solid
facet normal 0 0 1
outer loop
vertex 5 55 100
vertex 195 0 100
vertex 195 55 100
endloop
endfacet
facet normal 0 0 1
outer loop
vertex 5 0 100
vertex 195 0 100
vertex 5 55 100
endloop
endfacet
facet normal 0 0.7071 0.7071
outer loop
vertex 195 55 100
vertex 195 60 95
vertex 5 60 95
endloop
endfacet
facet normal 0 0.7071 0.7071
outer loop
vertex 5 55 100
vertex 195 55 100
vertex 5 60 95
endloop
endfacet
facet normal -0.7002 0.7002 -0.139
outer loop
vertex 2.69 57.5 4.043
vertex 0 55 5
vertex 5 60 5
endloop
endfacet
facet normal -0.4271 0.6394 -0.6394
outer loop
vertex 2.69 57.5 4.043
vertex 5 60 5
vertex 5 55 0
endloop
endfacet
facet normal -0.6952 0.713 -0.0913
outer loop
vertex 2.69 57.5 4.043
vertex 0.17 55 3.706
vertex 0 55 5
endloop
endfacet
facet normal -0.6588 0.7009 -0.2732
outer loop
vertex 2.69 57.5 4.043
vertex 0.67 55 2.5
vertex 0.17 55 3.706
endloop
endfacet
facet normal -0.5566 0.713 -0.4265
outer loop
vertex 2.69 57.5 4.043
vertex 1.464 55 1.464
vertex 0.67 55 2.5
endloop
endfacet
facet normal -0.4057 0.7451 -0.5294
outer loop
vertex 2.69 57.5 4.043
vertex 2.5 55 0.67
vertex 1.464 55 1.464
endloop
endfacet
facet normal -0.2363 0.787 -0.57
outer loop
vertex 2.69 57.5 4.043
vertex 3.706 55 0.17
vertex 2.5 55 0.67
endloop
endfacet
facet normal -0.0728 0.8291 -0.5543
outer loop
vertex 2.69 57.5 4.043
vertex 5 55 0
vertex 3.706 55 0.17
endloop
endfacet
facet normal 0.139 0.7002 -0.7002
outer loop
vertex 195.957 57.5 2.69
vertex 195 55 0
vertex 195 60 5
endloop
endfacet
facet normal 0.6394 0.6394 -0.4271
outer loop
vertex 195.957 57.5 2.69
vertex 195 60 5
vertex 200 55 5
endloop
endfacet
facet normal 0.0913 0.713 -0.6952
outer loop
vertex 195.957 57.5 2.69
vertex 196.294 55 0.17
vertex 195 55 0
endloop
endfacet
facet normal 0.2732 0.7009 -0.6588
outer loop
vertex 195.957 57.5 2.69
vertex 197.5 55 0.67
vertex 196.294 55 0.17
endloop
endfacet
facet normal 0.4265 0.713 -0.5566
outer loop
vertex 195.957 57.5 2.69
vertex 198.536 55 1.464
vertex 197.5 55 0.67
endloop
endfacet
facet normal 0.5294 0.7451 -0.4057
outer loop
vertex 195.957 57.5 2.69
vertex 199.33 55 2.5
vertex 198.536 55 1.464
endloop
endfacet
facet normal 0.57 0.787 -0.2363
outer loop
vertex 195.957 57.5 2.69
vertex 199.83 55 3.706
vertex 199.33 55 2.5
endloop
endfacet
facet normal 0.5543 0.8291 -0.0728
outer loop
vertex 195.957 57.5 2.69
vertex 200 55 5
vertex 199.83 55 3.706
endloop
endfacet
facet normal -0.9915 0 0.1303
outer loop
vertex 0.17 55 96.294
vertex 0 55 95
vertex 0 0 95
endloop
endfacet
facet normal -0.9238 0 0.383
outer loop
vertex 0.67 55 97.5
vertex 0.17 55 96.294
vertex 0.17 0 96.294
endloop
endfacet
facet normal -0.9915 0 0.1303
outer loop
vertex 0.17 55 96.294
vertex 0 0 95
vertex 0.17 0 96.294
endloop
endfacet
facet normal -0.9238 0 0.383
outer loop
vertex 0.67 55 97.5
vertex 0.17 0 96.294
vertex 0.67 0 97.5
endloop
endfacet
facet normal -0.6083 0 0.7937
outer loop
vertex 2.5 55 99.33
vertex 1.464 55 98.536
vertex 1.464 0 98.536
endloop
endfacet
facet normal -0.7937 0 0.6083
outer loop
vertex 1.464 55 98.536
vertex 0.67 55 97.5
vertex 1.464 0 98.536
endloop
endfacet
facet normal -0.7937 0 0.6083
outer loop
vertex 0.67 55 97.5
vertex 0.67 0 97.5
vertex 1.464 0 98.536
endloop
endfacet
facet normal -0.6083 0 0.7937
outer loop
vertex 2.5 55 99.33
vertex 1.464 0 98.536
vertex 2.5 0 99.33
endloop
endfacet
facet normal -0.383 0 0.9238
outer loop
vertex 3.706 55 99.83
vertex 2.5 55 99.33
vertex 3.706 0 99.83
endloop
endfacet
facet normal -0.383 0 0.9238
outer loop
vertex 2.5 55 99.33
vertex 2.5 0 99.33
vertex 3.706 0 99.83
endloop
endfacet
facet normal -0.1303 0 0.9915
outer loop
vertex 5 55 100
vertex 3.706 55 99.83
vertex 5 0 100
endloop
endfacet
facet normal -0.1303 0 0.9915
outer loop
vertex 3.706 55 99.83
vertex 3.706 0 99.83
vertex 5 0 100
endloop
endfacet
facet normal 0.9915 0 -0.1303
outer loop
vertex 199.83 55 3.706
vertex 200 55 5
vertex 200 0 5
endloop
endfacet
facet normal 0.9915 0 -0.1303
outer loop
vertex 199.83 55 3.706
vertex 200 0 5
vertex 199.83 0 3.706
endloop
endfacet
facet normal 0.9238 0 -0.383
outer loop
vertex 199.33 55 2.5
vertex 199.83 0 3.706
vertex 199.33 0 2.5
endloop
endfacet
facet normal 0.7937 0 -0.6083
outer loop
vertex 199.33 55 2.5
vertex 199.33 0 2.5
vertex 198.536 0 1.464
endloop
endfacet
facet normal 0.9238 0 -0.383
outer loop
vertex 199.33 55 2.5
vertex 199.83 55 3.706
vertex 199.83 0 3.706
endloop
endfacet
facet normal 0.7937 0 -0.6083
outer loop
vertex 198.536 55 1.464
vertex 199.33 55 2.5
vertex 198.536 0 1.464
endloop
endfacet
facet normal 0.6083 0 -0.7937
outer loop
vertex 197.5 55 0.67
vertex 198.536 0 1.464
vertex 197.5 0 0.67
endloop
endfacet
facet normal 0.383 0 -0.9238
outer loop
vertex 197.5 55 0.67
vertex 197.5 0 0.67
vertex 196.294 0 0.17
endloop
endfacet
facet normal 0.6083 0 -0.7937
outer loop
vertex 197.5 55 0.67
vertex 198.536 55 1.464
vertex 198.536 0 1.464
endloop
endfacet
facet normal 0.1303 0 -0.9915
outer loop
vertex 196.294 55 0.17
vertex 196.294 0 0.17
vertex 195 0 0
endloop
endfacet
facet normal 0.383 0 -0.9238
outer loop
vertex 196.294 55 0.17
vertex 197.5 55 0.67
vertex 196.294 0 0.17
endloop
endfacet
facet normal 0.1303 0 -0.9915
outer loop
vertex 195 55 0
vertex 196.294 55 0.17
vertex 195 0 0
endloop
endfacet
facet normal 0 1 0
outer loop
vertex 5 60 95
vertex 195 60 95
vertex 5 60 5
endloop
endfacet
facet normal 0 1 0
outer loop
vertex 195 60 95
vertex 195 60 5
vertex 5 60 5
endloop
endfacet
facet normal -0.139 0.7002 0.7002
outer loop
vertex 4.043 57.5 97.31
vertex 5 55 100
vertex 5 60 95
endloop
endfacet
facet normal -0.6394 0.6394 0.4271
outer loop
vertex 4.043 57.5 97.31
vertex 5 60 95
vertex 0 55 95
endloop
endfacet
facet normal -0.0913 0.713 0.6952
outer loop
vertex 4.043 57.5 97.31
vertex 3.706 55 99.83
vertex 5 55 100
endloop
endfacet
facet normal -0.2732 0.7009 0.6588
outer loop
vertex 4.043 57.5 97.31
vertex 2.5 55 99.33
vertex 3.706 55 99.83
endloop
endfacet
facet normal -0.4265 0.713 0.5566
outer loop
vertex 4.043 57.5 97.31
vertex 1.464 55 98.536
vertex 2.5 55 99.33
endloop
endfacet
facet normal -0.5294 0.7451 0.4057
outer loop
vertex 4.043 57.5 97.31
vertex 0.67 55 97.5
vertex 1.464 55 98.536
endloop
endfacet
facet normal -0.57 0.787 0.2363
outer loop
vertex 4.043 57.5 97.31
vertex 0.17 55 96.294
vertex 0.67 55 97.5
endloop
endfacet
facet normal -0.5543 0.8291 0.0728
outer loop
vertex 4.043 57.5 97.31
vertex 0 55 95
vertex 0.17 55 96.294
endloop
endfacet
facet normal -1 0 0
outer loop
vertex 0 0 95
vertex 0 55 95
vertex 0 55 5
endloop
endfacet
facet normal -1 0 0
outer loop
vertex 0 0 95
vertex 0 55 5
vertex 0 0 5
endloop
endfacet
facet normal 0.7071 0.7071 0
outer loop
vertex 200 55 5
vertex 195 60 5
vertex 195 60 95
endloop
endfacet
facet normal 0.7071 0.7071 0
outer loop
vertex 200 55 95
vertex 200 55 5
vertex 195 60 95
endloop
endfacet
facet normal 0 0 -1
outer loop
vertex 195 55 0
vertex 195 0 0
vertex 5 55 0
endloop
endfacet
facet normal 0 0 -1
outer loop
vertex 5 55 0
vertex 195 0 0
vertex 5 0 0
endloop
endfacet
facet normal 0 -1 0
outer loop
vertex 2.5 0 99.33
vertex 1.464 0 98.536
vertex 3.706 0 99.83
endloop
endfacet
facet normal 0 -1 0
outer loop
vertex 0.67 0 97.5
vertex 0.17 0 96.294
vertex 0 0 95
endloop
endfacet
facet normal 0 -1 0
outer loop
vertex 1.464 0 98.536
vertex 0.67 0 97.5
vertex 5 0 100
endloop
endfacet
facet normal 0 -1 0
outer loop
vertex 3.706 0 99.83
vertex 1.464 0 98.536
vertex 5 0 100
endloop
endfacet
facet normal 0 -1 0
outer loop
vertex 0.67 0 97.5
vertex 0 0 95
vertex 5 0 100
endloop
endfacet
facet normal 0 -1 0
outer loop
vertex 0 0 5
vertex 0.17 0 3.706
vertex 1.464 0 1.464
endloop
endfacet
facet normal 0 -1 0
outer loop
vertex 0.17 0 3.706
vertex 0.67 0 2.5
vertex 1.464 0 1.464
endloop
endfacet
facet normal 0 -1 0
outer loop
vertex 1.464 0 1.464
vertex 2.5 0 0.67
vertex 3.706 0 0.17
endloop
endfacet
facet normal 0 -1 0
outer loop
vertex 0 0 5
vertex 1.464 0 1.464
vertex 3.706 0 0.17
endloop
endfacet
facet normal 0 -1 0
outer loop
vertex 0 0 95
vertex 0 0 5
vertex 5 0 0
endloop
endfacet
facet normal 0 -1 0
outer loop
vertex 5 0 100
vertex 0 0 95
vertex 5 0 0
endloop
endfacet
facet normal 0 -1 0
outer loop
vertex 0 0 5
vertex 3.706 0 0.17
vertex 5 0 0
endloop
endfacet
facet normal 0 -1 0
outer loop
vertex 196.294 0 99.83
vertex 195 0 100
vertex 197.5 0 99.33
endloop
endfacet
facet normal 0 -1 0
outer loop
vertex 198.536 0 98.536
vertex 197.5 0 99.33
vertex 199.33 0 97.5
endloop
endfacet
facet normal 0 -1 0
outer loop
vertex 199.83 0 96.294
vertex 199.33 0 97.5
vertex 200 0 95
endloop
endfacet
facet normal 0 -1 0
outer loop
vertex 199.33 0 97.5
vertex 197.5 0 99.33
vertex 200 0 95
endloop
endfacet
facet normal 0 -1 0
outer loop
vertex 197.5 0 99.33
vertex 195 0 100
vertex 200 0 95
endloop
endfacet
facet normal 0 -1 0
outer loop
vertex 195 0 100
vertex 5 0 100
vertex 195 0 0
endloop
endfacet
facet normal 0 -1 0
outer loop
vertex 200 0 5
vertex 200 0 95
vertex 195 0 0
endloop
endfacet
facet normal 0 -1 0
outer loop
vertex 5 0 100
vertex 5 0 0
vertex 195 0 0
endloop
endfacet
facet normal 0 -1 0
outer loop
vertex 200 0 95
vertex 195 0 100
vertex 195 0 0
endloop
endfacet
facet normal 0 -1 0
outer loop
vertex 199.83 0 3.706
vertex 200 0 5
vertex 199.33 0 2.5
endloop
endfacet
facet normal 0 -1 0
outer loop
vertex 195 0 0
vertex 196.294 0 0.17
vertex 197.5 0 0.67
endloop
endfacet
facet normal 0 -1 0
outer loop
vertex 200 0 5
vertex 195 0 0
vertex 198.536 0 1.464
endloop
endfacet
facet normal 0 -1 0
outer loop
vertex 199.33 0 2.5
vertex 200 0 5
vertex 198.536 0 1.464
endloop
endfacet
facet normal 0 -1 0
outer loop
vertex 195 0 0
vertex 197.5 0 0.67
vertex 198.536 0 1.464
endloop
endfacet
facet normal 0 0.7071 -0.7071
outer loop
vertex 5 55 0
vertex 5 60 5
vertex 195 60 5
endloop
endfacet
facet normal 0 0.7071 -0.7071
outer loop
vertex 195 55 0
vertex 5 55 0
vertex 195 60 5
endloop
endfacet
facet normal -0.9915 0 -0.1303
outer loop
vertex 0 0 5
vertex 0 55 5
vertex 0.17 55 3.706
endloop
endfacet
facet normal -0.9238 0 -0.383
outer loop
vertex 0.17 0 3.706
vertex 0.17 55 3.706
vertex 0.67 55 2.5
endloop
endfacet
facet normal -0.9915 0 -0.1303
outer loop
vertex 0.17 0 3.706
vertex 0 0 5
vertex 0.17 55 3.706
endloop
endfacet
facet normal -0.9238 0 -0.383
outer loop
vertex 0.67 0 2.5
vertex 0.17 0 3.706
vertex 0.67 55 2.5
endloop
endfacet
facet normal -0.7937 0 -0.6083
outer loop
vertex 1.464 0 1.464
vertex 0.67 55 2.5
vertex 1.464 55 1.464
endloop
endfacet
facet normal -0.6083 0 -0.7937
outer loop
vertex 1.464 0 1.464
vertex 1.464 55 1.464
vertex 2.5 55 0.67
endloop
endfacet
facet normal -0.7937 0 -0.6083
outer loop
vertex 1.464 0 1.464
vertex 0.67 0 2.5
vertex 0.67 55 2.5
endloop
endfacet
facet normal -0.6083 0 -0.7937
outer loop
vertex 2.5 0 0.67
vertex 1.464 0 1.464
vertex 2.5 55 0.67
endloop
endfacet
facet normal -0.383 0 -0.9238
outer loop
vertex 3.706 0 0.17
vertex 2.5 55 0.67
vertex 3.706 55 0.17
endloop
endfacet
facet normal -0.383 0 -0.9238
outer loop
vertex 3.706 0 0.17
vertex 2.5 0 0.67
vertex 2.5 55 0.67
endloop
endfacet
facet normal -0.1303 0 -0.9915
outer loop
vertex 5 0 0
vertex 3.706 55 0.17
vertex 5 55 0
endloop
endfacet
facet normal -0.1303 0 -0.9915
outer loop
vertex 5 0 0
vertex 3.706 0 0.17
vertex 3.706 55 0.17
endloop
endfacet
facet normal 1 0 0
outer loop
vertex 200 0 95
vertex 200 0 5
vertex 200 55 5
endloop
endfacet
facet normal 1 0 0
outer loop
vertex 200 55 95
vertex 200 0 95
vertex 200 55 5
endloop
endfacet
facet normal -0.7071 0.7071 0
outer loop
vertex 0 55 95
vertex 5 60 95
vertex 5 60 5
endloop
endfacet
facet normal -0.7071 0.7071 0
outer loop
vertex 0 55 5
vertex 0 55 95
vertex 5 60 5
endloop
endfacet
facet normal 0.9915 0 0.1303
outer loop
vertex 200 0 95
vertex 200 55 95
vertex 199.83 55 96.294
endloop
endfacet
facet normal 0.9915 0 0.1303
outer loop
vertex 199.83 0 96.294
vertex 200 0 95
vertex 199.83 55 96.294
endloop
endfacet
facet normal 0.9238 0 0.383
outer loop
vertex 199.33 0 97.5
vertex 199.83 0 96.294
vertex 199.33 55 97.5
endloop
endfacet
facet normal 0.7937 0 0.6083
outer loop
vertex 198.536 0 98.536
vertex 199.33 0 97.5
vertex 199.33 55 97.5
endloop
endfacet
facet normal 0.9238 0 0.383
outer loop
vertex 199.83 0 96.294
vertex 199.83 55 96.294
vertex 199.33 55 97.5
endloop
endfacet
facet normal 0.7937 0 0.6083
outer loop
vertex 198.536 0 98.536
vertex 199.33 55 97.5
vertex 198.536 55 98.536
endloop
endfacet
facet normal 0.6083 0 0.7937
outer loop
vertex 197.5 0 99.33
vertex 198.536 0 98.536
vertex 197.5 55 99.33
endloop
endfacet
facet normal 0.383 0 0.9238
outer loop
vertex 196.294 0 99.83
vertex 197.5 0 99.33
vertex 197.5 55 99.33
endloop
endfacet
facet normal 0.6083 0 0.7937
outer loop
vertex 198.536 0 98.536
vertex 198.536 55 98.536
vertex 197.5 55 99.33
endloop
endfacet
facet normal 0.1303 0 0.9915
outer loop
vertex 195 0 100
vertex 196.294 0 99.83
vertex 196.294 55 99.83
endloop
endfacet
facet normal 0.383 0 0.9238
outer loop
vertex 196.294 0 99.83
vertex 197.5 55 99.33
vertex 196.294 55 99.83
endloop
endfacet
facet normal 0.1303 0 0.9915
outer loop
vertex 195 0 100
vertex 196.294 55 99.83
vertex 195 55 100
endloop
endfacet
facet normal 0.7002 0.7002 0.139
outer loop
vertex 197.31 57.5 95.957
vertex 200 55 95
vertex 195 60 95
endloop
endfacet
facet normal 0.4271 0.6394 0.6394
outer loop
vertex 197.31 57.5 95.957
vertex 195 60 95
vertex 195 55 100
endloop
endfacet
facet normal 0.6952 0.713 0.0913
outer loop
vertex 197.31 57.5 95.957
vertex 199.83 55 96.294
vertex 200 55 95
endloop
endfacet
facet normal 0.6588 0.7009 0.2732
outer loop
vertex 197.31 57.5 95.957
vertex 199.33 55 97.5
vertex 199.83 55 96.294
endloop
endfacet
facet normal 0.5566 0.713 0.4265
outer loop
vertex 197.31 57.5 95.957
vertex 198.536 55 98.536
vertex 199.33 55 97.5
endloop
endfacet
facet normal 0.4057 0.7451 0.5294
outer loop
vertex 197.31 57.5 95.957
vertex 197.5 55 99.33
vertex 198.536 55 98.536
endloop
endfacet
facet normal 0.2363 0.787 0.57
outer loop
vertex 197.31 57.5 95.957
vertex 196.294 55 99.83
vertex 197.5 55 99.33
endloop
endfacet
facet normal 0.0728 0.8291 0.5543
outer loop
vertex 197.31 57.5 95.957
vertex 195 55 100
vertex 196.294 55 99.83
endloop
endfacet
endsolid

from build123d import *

# Parameters (mm, degrees)
DODANIE_WYCI_GNI_CIE1_DEPTH = 100
ZAOKR_GLENIE4_R             = 5
ZAOKR_GLENIE5_SIZE          = 5


with BuildPart() as part:
    # Szkic 3D1 → Dodanie-wyciągnięcie1 (new body)
    with BuildSketch(Plane(origin=(0, 0, 0), x_dir=(0.9578262852211514, 0.2873478855663454, 0), z_dir=(0, 0, -1))):
        Polygon((0, 0), (191.565257044, 57.469577113), (208.806130178, 0), (17.240873134, -57.469577113), align=None)
    extrude(amount=-DODANIE_WYCI_GNI_CIE1_DEPTH)

    # Zaokrąglenie4
    zaokr_glenie4_edges = [part.edges().sort_by_distance(p)[0] for p in [
        (200, 30, 0),
        (200, 30, 100),
        (0, 30, 0),
        (0, 30, 100),
    ]]
    fillet(zaokr_glenie4_edges, radius=ZAOKR_GLENIE4_R)

    # Zaokrąglenie5
    zaokr_glenie5_edges = [part.edges().sort_by_distance(p)[0] for p in [
        (200, 60, 50),
        (100, 60, 100),
        (100, 60, 0),
        (0, 60, 50),
        (1.464466094, 60, 98.535533906),
        (1.464466094, 60, 1.464466094),
        (198.535533906, 60, 98.535533906),
        (198.535533906, 60, 1.464466094),
    ]]
    chamfer(zaokr_glenie5_edges, length=ZAOKR_GLENIE5_SIZE - 0.0001)  # a hair under: the kernel refuses the full size


solid = part.part
